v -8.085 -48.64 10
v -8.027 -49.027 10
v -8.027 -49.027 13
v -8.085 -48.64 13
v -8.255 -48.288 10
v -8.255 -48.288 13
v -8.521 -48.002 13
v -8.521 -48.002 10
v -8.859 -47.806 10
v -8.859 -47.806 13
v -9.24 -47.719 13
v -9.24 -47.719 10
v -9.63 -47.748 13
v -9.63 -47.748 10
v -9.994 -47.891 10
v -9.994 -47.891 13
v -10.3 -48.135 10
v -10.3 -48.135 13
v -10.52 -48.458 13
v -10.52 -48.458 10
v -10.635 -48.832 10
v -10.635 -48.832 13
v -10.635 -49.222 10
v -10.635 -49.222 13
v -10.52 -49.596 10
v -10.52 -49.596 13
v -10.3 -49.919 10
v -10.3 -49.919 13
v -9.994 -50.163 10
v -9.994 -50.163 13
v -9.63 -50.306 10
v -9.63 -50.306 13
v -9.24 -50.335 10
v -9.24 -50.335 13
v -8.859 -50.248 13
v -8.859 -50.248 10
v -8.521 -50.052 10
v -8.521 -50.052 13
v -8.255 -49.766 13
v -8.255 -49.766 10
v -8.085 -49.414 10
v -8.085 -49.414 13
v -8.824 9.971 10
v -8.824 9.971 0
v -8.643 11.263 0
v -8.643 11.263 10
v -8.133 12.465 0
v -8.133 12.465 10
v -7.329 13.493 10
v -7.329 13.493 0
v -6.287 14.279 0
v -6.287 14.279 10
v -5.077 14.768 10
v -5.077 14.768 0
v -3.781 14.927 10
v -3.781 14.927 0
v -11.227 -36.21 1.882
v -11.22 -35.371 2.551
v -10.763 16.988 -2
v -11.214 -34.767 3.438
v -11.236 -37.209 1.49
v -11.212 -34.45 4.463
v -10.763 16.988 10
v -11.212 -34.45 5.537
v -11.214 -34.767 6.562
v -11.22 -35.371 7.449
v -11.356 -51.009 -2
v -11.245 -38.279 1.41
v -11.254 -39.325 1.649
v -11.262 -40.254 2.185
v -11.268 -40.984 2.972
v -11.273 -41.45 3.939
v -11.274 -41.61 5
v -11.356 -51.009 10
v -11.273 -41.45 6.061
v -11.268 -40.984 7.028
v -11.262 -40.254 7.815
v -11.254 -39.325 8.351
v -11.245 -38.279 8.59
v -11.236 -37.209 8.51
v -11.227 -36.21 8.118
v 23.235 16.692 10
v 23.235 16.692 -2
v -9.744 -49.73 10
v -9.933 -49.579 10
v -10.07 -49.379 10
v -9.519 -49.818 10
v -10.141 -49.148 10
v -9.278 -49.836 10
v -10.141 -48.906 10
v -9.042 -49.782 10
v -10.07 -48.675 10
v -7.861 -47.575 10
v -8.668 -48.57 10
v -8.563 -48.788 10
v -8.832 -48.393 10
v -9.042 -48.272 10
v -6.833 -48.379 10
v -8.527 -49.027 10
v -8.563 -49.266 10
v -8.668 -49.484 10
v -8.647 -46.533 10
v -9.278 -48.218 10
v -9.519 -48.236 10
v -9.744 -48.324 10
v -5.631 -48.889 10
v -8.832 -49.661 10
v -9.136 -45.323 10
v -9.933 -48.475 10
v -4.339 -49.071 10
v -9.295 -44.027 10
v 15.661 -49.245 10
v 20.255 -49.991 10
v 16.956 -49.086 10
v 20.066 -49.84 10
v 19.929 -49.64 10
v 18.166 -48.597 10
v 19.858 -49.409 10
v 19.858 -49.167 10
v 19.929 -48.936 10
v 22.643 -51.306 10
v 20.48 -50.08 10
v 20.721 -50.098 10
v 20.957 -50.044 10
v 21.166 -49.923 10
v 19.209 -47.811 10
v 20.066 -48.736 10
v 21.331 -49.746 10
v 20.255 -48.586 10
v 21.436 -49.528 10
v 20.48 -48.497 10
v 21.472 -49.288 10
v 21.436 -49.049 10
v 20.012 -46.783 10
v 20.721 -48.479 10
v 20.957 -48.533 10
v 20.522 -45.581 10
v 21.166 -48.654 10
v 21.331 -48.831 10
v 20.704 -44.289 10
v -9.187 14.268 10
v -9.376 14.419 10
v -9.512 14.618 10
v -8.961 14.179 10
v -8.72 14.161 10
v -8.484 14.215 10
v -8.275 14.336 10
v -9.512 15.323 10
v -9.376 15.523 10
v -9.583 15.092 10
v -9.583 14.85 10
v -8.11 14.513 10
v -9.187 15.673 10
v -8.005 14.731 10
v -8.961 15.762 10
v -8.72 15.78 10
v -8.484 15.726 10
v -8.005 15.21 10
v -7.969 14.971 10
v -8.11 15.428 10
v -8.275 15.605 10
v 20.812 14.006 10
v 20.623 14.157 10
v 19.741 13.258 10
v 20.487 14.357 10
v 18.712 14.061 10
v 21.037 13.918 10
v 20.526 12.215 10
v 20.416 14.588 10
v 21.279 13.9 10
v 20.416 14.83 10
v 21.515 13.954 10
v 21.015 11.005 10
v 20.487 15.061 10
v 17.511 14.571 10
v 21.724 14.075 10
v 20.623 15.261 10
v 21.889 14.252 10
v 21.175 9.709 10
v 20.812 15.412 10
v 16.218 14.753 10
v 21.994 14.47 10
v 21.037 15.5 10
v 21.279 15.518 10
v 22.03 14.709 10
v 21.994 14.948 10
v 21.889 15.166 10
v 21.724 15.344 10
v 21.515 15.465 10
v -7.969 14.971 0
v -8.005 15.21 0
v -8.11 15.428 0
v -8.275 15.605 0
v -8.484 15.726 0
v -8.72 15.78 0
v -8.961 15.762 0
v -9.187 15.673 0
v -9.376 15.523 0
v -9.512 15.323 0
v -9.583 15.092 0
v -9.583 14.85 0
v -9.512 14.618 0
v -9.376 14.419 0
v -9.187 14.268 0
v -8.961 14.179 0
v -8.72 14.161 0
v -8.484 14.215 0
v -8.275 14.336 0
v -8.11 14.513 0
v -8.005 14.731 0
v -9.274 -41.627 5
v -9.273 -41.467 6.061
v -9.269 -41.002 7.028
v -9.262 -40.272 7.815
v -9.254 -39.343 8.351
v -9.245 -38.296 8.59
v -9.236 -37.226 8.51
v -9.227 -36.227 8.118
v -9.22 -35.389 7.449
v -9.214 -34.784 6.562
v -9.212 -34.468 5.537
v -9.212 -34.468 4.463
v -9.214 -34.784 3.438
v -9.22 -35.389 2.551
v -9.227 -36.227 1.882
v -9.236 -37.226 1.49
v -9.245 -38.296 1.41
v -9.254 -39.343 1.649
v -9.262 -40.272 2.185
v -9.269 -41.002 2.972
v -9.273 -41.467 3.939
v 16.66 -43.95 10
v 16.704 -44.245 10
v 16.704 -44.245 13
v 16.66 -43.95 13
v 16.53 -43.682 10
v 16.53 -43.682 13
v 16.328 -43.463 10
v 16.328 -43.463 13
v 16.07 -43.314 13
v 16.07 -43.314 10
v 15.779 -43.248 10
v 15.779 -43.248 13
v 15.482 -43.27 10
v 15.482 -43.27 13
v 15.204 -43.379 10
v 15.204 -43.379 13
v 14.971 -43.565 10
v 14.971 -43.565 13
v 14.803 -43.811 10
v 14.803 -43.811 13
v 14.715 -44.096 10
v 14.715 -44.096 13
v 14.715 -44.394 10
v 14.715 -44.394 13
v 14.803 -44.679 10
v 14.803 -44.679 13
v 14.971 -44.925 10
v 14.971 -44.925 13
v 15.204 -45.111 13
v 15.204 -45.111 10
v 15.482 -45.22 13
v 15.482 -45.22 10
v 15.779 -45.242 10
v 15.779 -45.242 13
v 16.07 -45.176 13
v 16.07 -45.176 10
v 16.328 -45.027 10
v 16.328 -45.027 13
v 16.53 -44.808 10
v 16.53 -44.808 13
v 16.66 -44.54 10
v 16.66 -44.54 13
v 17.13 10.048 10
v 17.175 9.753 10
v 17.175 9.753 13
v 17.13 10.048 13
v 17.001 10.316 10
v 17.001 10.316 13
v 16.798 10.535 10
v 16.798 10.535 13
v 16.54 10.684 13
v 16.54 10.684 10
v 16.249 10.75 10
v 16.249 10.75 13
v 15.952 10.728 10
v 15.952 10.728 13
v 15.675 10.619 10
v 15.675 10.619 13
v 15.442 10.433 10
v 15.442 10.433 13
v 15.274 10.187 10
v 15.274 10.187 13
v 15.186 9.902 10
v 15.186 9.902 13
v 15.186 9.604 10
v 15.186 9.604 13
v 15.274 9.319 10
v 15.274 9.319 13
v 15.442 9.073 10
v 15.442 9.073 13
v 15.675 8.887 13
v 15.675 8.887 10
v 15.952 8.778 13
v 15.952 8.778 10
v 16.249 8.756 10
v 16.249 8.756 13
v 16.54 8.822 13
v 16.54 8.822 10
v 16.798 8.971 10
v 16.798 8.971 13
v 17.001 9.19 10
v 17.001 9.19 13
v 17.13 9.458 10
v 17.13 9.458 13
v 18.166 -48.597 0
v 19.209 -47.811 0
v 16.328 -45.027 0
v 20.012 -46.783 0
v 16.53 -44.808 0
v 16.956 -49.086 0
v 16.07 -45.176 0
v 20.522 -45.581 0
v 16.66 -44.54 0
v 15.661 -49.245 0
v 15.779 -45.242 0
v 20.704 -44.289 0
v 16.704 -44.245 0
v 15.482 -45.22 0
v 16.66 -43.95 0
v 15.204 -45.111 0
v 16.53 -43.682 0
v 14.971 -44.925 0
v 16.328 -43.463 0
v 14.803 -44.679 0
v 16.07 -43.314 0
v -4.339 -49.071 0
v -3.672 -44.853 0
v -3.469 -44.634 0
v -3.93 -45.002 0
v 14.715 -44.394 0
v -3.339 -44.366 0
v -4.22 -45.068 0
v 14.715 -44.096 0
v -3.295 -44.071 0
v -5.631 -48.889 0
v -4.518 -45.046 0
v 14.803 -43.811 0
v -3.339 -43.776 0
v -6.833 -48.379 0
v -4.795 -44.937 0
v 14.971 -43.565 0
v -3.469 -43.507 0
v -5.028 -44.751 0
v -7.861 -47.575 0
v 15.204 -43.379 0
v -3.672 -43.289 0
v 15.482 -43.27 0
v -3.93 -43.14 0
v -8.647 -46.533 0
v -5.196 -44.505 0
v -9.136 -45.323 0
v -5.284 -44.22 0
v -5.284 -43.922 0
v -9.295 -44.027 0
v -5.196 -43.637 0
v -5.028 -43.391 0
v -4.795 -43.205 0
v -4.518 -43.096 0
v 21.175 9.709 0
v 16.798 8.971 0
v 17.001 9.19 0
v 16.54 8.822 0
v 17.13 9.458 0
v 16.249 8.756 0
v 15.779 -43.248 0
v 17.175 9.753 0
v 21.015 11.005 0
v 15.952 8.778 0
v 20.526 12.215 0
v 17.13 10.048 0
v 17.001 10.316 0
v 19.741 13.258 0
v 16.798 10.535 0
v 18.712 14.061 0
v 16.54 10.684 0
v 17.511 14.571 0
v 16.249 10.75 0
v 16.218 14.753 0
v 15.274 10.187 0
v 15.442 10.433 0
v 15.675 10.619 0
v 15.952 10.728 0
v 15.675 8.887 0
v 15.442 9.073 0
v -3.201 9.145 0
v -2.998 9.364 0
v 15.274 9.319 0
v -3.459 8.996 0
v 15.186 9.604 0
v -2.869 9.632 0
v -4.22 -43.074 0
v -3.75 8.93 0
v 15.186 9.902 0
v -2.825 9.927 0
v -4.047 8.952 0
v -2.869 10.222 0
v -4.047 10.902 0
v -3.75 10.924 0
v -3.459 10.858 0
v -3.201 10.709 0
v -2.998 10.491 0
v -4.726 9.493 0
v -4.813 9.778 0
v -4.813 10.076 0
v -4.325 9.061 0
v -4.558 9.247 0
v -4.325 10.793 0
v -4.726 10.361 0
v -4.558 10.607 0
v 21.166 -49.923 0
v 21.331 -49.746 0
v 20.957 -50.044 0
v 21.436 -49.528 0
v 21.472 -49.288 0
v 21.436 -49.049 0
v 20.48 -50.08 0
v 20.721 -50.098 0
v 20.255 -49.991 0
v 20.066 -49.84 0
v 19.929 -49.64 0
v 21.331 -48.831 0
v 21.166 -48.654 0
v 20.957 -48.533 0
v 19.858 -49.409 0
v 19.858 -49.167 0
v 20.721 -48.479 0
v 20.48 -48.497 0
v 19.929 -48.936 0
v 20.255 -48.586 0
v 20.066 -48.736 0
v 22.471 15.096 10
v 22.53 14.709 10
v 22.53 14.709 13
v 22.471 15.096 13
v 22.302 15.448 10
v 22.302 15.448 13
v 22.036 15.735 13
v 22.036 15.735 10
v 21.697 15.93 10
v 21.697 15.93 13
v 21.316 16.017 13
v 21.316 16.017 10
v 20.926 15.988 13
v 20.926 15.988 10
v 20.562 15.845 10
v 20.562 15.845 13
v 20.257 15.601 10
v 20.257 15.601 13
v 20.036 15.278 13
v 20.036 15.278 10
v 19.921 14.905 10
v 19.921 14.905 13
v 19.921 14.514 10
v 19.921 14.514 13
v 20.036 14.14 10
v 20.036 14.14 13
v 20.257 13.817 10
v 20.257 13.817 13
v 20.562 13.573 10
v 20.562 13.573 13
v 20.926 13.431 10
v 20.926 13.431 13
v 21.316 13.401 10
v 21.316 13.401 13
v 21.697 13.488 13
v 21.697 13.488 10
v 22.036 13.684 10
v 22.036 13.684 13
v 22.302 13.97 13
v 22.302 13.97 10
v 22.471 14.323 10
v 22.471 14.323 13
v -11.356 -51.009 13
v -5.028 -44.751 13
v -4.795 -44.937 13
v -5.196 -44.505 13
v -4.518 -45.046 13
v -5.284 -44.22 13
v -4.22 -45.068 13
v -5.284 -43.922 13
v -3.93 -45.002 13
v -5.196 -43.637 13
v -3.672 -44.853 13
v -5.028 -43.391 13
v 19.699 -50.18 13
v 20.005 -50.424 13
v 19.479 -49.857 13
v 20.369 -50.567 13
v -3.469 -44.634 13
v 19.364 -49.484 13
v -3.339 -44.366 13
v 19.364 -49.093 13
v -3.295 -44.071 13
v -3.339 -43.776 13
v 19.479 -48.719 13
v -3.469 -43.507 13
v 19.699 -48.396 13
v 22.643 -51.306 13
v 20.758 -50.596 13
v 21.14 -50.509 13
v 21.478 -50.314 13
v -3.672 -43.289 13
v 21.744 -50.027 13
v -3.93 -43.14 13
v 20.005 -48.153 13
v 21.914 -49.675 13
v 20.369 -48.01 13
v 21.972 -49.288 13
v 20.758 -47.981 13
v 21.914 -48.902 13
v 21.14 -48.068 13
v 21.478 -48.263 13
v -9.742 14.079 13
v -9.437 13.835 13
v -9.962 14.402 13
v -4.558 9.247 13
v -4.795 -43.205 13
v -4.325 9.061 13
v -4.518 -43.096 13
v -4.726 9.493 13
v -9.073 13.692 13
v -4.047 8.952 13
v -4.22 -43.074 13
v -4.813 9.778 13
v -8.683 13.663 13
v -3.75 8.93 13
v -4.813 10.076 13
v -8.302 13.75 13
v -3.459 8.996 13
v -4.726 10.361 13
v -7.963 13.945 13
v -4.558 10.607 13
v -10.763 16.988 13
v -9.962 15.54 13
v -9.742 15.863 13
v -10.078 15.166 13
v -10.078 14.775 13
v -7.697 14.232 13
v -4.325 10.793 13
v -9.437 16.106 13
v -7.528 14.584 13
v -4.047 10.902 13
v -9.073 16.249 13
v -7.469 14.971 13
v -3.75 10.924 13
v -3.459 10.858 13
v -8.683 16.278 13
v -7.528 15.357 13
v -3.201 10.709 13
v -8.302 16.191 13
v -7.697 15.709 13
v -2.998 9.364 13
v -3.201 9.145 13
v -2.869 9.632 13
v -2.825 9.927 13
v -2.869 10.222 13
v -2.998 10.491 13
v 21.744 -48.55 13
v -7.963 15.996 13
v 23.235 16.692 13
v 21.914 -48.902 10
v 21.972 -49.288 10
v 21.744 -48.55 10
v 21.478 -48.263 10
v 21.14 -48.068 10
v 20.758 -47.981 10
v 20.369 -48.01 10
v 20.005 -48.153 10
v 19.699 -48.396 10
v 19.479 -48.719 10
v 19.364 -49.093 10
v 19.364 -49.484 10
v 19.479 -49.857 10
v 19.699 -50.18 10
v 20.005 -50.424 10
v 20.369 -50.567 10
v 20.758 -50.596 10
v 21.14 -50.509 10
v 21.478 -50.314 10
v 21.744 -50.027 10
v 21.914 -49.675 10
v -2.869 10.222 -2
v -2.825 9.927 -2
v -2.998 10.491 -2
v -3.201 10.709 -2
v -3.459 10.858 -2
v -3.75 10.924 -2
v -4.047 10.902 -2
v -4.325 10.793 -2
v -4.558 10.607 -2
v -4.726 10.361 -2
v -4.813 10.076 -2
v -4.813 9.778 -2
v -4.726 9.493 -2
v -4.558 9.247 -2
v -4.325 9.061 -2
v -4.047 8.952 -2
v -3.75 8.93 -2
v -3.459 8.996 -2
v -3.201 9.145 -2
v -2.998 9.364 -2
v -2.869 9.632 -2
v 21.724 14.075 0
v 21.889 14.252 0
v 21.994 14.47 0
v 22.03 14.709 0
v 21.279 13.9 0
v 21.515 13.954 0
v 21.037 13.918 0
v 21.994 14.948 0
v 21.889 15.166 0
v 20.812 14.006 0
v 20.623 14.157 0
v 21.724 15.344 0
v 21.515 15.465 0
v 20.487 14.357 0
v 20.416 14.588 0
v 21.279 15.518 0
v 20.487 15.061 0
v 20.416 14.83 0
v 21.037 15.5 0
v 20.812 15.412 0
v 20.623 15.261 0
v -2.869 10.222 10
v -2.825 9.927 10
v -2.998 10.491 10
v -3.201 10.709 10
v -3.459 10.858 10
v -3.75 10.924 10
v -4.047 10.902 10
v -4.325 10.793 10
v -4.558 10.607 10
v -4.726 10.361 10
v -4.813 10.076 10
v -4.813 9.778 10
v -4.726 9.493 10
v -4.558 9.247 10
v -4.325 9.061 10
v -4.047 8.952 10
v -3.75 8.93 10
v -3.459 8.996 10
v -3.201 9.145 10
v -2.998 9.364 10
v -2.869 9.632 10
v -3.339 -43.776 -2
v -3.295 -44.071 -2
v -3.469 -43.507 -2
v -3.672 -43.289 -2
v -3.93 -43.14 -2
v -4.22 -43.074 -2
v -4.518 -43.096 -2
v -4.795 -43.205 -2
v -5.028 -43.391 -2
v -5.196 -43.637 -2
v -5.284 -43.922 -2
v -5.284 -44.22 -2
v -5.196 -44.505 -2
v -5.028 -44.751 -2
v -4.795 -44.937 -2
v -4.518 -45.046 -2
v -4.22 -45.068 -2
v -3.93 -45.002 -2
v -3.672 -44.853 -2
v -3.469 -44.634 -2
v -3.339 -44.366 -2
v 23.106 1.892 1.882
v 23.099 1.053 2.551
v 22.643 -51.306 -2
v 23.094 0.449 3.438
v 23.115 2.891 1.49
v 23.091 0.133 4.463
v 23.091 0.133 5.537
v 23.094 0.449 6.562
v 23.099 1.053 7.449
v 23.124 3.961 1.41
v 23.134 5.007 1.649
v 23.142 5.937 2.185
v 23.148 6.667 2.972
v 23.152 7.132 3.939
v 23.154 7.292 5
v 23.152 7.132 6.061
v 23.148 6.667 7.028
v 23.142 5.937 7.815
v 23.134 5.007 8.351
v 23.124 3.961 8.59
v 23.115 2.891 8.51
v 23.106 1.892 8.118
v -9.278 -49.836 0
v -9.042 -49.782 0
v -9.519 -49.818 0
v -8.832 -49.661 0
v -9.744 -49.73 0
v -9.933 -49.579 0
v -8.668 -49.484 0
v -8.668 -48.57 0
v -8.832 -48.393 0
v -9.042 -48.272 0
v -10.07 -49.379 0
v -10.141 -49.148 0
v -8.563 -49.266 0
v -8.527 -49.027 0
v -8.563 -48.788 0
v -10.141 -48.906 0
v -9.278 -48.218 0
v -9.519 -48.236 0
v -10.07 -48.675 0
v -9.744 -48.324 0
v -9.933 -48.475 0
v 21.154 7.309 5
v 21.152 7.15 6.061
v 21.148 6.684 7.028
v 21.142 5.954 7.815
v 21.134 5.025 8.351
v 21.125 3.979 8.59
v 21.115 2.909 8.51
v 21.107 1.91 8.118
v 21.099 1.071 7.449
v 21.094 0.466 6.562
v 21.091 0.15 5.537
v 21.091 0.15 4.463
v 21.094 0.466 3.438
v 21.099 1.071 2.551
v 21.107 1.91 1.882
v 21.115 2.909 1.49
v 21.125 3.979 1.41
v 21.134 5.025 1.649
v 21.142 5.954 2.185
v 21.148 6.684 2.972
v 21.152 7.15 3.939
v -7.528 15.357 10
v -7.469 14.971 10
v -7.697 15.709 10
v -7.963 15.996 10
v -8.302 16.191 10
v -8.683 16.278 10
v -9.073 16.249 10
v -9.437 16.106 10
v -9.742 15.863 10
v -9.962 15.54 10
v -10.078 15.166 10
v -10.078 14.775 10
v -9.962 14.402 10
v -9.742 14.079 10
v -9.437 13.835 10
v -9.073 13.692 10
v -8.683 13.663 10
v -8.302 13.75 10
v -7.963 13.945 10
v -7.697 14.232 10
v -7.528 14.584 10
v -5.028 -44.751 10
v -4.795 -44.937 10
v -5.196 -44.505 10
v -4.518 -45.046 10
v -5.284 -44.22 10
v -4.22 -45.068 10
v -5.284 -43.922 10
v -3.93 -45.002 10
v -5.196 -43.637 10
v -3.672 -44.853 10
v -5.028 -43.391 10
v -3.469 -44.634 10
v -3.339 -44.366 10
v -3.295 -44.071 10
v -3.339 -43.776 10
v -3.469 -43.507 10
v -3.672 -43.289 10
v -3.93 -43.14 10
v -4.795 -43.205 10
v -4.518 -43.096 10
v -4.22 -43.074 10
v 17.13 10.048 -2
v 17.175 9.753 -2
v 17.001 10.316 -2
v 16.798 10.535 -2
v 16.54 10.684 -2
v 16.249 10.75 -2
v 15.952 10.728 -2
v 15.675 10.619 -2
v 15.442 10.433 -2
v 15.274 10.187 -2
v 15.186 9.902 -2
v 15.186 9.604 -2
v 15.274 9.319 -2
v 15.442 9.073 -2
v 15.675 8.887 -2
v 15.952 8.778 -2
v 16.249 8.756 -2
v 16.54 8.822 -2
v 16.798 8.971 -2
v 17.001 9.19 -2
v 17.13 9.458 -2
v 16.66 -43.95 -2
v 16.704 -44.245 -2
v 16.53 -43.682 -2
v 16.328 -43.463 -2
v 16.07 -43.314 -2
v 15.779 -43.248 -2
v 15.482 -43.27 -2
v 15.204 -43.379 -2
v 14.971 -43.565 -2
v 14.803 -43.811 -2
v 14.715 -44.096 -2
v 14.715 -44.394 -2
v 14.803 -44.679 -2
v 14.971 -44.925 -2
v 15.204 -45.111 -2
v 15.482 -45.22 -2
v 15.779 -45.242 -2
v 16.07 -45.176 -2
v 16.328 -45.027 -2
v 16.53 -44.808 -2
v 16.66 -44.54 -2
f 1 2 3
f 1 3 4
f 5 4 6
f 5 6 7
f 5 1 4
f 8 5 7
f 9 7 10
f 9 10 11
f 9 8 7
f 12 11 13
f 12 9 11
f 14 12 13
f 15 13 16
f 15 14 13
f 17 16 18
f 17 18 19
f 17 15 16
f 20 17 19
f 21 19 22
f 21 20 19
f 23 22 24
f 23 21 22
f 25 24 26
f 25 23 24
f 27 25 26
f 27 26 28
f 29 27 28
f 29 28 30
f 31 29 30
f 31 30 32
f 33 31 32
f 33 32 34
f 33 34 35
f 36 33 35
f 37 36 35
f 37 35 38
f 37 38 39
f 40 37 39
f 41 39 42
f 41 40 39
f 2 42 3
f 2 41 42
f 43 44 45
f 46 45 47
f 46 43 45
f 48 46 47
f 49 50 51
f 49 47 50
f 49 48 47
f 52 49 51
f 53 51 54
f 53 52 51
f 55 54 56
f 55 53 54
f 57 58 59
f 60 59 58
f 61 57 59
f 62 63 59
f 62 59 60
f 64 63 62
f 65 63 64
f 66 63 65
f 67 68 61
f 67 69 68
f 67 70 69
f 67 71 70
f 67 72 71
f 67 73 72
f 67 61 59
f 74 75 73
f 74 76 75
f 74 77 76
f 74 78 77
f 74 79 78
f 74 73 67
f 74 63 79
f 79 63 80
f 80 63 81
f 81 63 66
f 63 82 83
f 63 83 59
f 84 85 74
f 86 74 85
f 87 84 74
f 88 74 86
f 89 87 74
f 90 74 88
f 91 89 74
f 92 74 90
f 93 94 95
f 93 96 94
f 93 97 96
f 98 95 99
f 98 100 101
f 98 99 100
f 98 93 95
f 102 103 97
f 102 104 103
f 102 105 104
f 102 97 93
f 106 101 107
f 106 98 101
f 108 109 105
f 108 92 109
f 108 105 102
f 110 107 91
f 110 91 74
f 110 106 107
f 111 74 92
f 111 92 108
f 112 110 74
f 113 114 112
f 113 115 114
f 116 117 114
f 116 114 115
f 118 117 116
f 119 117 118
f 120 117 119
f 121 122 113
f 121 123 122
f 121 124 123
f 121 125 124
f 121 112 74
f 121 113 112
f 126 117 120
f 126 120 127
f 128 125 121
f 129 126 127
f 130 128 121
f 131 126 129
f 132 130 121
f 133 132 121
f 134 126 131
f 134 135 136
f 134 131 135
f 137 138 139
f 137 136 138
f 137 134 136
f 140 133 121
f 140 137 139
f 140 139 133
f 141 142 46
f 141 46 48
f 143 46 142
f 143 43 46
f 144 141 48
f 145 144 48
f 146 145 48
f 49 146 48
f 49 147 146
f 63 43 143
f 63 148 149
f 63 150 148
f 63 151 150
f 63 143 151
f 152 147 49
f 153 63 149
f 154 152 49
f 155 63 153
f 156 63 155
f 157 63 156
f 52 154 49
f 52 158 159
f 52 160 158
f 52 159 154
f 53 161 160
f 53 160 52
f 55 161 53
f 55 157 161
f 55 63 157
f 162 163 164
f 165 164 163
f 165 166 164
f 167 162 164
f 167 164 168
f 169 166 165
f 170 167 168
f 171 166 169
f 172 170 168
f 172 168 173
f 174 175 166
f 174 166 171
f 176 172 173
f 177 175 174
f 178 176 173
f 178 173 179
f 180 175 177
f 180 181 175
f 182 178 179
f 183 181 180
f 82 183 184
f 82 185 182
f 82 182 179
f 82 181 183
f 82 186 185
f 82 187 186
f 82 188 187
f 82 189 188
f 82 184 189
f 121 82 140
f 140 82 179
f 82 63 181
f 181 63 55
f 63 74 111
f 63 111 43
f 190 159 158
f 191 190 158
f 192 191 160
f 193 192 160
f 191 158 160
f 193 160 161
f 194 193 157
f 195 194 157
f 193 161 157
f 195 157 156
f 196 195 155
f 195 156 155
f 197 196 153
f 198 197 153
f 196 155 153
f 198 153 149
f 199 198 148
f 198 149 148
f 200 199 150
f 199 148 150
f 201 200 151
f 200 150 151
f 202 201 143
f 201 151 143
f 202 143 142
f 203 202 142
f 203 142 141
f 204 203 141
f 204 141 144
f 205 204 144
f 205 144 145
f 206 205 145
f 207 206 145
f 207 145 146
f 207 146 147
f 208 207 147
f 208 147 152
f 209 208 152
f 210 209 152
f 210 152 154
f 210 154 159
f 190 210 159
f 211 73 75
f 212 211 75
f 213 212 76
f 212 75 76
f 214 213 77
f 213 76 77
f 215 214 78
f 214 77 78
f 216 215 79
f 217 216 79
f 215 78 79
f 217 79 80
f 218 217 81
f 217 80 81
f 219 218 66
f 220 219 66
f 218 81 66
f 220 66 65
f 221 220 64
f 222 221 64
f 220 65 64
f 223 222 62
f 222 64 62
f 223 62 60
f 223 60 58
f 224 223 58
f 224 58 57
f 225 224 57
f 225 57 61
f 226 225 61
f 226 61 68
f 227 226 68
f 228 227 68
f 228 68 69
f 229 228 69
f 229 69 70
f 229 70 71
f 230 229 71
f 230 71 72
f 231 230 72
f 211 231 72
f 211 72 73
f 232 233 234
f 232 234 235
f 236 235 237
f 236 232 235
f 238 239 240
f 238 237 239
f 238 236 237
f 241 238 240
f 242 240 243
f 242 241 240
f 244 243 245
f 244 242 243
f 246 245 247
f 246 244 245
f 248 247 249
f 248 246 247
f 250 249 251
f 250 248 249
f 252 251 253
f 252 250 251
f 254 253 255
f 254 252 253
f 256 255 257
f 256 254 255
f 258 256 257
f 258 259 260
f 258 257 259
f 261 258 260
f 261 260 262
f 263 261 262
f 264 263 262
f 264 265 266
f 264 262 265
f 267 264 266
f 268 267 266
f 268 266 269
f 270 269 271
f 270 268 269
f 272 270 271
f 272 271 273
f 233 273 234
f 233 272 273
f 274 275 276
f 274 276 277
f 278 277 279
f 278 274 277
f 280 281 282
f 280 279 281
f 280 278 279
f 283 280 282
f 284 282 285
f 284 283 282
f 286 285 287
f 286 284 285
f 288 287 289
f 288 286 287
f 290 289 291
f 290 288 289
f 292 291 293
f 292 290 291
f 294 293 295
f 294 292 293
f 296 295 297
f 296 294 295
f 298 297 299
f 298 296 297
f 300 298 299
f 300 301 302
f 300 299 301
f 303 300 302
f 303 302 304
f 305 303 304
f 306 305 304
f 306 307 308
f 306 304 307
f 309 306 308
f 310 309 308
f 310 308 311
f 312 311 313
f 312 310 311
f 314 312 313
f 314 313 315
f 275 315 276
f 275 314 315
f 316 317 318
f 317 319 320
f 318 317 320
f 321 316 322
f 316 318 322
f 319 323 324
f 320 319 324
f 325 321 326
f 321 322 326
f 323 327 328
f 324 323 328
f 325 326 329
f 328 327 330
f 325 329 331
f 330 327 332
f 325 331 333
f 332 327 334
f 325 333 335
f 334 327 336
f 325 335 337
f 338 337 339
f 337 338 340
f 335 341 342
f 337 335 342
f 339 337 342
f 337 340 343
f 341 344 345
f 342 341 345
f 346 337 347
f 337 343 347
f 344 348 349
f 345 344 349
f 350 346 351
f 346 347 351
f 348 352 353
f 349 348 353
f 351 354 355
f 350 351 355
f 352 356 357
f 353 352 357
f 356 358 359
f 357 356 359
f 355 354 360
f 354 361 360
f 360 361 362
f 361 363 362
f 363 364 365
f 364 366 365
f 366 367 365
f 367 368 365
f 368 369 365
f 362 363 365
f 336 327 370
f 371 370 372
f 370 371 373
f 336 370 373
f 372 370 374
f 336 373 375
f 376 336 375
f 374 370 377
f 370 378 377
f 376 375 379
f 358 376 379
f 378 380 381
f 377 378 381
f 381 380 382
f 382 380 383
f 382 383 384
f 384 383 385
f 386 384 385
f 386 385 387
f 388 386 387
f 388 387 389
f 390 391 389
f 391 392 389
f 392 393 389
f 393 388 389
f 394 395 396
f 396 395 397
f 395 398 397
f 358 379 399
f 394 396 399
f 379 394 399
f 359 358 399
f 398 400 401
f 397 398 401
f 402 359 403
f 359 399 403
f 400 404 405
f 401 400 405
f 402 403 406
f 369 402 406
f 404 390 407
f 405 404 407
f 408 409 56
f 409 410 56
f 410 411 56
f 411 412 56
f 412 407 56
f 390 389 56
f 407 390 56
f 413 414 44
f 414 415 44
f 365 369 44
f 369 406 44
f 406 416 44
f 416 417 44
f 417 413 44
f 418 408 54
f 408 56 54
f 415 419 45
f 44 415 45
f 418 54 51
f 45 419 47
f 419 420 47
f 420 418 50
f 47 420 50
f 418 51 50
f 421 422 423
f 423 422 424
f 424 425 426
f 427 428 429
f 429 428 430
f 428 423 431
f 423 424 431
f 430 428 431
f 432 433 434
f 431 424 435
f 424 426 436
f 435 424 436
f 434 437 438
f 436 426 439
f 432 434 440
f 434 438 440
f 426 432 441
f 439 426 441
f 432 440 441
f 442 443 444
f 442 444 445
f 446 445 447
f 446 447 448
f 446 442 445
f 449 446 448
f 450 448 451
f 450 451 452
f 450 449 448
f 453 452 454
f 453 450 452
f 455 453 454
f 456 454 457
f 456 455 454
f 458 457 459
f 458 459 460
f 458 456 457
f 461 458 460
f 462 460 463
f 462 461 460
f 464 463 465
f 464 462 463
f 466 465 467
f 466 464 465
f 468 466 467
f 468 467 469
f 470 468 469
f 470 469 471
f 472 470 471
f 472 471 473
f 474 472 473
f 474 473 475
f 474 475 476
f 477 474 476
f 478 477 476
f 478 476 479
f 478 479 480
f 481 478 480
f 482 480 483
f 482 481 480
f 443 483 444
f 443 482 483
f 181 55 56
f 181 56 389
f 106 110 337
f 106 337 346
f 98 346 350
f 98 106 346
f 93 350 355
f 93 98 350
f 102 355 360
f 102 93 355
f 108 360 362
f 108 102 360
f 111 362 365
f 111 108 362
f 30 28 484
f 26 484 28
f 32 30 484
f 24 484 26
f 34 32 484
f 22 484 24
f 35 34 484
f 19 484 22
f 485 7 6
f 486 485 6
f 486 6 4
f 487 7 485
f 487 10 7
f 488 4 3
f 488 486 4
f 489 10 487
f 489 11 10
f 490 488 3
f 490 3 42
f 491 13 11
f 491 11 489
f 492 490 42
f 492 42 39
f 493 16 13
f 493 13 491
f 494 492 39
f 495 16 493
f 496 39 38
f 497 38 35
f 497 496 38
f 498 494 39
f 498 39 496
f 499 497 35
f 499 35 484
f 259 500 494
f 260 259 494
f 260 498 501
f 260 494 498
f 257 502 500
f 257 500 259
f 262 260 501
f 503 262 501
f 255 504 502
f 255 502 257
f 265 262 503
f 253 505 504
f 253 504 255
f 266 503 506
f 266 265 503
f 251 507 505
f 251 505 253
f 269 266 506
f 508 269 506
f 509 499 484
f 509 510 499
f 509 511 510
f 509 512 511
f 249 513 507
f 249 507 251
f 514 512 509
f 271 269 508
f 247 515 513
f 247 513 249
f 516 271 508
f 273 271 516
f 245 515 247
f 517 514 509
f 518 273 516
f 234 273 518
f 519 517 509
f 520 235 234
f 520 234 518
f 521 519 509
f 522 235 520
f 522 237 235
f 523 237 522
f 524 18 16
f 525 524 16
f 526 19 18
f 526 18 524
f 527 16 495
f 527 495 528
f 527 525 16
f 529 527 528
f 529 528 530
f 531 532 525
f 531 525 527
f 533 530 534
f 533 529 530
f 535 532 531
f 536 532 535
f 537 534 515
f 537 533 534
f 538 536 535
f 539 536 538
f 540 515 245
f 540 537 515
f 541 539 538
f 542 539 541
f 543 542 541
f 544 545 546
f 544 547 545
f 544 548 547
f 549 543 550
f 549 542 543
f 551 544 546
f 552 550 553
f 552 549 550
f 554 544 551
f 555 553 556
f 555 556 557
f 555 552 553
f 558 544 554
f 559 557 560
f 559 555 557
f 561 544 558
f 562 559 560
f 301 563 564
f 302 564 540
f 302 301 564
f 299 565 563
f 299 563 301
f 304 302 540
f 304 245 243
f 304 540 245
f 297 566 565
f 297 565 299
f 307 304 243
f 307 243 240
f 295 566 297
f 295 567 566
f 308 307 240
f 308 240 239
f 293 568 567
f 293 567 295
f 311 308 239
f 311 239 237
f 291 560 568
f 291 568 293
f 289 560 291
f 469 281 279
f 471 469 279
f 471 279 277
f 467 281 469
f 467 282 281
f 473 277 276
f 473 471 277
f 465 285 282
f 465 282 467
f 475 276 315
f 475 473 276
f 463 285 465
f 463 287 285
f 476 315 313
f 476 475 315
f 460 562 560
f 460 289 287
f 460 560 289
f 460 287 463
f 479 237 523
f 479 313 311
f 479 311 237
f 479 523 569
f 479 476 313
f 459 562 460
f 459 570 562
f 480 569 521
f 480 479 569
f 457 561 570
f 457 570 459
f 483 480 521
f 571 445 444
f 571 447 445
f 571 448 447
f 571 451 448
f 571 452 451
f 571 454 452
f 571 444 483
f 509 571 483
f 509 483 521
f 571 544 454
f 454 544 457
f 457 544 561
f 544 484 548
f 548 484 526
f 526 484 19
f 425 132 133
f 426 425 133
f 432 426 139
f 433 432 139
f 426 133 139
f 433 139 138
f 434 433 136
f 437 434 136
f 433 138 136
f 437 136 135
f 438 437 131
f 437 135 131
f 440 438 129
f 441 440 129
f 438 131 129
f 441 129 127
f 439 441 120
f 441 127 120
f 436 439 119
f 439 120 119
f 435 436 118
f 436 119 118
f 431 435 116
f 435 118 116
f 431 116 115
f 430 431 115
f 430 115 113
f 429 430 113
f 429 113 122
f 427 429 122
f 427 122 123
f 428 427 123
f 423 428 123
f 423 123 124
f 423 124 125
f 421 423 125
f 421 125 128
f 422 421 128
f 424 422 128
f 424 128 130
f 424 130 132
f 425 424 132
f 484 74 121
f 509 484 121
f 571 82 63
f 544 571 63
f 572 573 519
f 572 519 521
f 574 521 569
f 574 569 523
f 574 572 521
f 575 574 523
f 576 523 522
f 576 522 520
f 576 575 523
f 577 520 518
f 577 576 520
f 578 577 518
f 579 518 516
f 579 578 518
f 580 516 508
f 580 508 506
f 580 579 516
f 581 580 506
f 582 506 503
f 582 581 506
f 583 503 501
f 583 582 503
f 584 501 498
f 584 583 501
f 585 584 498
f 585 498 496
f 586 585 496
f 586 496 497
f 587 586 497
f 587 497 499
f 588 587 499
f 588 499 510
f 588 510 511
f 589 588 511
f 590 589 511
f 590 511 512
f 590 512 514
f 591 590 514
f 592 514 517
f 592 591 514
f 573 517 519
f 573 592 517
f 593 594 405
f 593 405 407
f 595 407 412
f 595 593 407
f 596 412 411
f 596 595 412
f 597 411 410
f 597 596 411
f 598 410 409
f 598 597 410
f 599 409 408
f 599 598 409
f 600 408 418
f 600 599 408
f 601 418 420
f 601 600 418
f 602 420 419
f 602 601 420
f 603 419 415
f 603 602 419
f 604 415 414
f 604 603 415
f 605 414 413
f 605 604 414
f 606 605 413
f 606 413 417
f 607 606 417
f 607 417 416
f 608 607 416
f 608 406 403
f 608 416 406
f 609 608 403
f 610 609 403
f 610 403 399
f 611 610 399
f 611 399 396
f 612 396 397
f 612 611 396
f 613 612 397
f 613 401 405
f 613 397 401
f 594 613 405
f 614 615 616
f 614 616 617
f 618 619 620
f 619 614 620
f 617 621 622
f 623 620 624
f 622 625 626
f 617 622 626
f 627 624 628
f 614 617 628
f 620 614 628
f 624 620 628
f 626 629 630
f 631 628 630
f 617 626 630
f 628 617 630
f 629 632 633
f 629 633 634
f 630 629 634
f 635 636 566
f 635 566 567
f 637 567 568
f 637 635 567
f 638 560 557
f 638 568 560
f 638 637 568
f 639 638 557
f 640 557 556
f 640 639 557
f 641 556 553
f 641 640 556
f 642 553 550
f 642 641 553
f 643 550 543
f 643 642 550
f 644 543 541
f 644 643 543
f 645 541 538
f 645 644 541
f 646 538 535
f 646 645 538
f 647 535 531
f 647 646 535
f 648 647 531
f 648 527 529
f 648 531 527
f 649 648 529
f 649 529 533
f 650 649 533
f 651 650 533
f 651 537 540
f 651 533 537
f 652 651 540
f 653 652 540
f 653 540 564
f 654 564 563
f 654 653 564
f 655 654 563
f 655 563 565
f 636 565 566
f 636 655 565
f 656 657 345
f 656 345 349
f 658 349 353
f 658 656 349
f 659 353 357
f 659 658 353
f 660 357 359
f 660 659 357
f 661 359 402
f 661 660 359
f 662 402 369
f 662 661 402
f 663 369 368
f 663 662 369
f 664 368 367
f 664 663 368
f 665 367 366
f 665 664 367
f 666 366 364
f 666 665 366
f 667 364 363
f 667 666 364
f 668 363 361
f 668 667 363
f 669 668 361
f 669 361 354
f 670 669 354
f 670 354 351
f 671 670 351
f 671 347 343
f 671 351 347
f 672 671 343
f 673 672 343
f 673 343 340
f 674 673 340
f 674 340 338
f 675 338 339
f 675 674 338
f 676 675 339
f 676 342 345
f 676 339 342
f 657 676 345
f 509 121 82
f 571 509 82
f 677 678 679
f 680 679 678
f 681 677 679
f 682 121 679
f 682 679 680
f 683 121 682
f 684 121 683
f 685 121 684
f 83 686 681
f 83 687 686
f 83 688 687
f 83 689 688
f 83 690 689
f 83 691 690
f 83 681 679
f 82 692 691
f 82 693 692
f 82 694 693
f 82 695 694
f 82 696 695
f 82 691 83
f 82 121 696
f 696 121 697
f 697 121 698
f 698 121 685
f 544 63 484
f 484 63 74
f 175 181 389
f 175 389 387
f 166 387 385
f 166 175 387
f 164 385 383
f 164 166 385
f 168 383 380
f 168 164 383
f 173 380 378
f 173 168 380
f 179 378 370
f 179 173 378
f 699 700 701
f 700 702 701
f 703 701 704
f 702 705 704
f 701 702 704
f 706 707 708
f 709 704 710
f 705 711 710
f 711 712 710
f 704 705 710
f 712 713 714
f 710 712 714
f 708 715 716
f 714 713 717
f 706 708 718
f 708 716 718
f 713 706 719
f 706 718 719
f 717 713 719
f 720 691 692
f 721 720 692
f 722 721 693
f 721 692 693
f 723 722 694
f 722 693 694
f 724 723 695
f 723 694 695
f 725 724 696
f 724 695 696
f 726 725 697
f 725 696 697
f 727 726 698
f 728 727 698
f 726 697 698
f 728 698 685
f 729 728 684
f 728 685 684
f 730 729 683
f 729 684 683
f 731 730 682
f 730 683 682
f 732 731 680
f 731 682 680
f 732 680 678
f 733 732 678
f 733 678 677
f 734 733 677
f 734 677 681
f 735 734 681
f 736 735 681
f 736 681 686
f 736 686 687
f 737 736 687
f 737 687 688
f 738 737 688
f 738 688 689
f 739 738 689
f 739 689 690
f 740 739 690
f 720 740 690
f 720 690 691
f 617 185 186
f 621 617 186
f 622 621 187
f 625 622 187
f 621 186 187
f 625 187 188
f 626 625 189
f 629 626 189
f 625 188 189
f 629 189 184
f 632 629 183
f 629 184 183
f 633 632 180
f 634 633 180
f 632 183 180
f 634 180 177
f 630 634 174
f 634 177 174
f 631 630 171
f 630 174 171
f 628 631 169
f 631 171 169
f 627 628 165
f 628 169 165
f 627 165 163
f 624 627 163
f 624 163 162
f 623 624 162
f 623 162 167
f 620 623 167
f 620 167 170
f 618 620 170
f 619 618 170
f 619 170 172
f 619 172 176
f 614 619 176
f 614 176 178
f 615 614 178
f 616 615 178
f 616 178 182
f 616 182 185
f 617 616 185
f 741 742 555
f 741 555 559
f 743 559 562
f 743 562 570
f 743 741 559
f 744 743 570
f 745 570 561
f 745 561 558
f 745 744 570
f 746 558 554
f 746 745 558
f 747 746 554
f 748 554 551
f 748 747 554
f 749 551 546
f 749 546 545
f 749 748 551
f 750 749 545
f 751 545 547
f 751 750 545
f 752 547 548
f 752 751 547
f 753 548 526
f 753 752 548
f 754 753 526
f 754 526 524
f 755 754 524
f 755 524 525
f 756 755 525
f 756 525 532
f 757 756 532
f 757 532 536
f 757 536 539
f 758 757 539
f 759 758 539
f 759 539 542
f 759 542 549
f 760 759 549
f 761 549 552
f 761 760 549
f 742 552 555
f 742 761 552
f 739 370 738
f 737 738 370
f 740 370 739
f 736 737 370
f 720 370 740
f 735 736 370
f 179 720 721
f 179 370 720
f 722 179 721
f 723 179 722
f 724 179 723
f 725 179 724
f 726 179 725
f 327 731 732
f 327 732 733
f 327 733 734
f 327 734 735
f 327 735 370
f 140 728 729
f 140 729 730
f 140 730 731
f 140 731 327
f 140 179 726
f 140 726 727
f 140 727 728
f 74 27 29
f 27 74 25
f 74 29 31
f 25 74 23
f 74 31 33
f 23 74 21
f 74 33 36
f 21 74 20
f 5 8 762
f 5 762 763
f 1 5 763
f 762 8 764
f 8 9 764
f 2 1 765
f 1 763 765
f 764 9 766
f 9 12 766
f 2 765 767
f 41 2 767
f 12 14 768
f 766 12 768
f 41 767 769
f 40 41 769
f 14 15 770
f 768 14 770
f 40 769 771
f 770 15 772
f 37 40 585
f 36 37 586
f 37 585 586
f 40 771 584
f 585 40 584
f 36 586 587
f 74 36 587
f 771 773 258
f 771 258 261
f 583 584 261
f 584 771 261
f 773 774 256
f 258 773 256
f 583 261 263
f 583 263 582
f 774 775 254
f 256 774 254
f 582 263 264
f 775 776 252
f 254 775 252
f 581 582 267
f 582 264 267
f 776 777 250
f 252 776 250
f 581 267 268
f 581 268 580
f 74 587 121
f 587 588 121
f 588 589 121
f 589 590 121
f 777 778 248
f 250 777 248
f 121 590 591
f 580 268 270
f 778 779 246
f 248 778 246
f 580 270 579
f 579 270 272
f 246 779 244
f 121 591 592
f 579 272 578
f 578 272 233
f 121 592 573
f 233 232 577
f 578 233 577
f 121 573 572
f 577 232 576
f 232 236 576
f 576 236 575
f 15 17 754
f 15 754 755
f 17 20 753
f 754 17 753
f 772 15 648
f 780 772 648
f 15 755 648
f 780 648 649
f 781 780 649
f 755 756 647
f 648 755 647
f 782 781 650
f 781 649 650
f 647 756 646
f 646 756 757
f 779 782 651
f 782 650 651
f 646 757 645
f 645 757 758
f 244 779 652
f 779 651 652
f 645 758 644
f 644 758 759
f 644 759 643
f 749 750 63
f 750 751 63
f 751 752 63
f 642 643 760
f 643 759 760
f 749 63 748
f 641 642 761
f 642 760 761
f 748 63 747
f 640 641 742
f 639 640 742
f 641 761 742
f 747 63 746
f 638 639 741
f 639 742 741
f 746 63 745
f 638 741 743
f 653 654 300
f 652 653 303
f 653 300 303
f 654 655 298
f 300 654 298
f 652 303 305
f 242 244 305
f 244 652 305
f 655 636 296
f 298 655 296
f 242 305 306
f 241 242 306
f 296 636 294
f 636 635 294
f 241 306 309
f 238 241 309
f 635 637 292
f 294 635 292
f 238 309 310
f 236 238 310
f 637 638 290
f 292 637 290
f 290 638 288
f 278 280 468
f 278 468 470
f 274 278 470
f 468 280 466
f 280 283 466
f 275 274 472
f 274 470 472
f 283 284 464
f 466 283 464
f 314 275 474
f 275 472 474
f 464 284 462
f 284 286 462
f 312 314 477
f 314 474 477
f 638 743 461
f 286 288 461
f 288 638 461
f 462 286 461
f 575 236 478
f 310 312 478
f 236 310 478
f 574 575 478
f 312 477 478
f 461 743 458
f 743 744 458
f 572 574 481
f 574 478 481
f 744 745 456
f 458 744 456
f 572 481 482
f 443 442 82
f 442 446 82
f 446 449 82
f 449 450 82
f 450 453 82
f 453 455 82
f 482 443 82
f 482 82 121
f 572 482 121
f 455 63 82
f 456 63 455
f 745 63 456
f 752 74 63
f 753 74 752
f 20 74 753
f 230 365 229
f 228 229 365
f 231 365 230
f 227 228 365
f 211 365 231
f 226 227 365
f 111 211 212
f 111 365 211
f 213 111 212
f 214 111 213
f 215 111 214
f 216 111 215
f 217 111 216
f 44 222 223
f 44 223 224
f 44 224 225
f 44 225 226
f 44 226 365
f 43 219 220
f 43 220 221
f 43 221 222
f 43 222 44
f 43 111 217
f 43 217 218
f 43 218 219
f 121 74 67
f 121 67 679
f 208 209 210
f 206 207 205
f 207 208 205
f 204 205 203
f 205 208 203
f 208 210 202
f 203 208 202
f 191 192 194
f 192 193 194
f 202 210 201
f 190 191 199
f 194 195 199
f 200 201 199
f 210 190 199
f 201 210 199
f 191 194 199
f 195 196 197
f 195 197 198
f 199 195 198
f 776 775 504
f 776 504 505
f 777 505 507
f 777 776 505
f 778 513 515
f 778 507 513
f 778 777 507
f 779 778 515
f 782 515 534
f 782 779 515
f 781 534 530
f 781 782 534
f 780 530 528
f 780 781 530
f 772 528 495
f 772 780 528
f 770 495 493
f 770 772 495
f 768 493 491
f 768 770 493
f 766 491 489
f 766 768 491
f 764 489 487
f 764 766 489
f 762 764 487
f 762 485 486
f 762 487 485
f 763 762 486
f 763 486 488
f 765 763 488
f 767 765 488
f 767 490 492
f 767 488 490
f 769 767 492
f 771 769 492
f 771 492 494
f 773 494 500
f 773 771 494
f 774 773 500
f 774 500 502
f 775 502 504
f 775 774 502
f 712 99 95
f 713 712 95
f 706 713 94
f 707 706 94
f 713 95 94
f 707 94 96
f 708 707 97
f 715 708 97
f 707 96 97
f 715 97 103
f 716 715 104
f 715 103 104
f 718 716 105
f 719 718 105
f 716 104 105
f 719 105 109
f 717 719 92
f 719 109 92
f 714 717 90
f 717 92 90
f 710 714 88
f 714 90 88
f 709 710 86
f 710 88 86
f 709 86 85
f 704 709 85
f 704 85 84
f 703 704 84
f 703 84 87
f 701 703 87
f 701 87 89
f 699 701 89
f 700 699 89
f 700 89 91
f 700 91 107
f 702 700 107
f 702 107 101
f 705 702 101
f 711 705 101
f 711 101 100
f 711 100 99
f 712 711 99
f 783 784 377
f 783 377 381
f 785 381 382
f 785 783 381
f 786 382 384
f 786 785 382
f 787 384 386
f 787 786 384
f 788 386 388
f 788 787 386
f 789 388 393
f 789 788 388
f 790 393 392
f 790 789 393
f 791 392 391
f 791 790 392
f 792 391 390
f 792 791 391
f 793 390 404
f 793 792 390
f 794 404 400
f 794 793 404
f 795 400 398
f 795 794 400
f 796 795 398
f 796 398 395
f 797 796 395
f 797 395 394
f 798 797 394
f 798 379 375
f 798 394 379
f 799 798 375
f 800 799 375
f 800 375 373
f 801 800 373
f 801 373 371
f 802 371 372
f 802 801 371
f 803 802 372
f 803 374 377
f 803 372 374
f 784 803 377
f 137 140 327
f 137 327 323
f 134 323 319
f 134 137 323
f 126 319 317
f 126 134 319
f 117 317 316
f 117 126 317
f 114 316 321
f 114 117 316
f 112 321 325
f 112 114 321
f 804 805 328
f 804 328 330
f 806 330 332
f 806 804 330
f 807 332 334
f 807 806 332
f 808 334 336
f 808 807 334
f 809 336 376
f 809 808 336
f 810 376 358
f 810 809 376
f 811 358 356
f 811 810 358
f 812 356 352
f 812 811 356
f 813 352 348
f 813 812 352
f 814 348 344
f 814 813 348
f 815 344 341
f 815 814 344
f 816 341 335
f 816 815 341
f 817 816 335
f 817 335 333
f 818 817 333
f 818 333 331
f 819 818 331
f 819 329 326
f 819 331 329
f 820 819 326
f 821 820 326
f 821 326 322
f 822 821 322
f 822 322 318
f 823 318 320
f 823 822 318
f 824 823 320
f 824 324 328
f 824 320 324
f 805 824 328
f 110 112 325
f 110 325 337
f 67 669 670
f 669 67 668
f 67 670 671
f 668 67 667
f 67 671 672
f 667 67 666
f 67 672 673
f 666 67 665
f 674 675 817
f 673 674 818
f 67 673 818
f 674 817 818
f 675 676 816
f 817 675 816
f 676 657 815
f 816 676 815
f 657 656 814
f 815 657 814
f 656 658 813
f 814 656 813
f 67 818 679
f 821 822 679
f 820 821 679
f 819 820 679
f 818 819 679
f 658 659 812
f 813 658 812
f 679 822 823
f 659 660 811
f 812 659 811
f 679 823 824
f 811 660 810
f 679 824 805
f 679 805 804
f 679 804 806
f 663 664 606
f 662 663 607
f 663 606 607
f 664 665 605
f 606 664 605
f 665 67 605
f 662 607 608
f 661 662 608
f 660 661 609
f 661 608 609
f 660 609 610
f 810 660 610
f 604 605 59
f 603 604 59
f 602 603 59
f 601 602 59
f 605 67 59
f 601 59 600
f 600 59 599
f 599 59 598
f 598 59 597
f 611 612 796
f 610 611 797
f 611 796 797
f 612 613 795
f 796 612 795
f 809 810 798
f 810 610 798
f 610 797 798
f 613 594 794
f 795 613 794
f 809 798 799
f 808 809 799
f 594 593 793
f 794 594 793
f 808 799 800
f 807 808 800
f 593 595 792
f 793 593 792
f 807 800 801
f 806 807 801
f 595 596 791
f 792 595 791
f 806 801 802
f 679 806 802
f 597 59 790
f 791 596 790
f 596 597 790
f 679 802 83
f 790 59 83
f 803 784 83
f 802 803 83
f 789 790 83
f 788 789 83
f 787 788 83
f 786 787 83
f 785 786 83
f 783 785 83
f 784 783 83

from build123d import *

# Parameters (mm, degrees)
SKETCH2_R               = 0.8115
BOSS_EXTRUDE1_DEPTH     = 12
BOSS_EXTRUDE2_DEPTH     = 2
SKETCH4_R               = 3.6
CUT_EXTRUDE1_DEPTH      = 3
SKETCH5_R               = 3.6
CUT_EXTRUDE2_DEPTH      = 3
SKETCH10_R              = 1.3115
BOSS_EXTRUDE3_DEPTH     = 3
CUT_EXTRUDE3_DEPTH      = 58.802809601
CUT_EXTRUDE3_DEPTH_BACK = 58.802809601
SKETCH11_R              = 1


with BuildPart() as part:
    # Sketch2 → Boss-Extrude1 (new body)
    with BuildSketch(Plane.XY.offset(10)):
        Polygon((22.642908935, -51.305750842), (23.235419693, 16.691667719), (-10.763289588, 16.987923098), (-11.355800345, -51.009495464), align=None)
        with Locations((-9.338449483, -49.026998175)):
            Circle(SKETCH2_R, mode=Mode.SUBTRACT)
        with Locations((20.660411647, -49.28839998)):
            Circle(SKETCH2_R, mode=Mode.SUBTRACT)
        with Locations((-8.7807923, 14.970572235)):
            Circle(SKETCH2_R, mode=Mode.SUBTRACT)
        with Locations((21.21806883, 14.709170431)):
            Circle(SKETCH2_R, mode=Mode.SUBTRACT)
        with BuildLine():
            Line((-9.294882486, -44.027187957), (-8.824359238, 9.970762017))
            ThreePointArc((-8.824359238, 9.970762017), (-7.32914224, 13.493401237), (-3.780982082, 14.927005238))
            Line((-3.780982082, 14.927005238), (16.218258612, 14.752737369))
            ThreePointArc((16.218258612, 14.752737369), (19.740897831, 13.257520371), (21.174501833, 9.709360213))
            Line((21.174501833, 9.709360213), (20.703978585, -44.288589762))
            ThreePointArc((20.703978585, -44.288589762), (19.208761587, -47.811228981), (15.660601429, -49.244832982))
            Line((15.660601429, -49.244832982), (-4.338639265, -49.070565113))
            ThreePointArc((-4.338639265, -49.070565113), (-7.861278484, -47.575348116), (-9.294882486, -44.027187957))
        make_face(mode=Mode.SUBTRACT)
    extrude(amount=-BOSS_EXTRUDE1_DEPTH)

    # Sketch3 → Boss-Extrude2 (add)
    with BuildSketch(Plane(origin=(0, 0, -2), x_dir=(-1, 0, 0), z_dir=(0, 0, -1))):
        Polygon((-22.642908935, -51.305750842), (11.355800345, -51.009495464), (10.763289588, 16.987923098), (-23.235419693, 16.691667719), align=None)
    extrude(amount=-BOSS_EXTRUDE2_DEPTH)

    # Sketch4 → Cut-Extrude1 (cut)
    with BuildSketch(Plane(origin=(-10.910489244, 0.095070995, 0), x_dir=(0, 0, -1), z_dir=(-0.9999620376663749, 0.008713393489992394, 0))):
        with Locations(Location((-5, 38.106506551, 0), (0, 0, 90))):
            Circle(SKETCH4_R)
    extrude(amount=-CUT_EXTRUDE1_DEPTH, mode=Mode.SUBTRACT)

    # Sketch5 → Cut-Extrude2 (cut)
    with BuildSketch(Plane(origin=(23.088220037, -0.201184384, 0), x_dir=(0, 0, 1), z_dir=(0.9999620376663749, -0.008713393489992394, 0))):
        with Locations(Location((5, -3.893493389, 0), (0, 0, 270))):
            Circle(SKETCH5_R)
    extrude(amount=-CUT_EXTRUDE2_DEPTH, mode=Mode.SUBTRACT)


with BuildPart() as body_2:
    # Sketch10 → Boss-Extrude3 (new body)
    with BuildSketch(Plane.XY.offset(10)):
        Polygon((-11.355800345, -51.009495464), (22.642908935, -51.305750842), (23.235419693, 16.691667719), (-10.763289588, 16.987923098), align=None)
        with Locations((20.660411647, -49.28839998)):
            Circle(SKETCH10_R, mode=Mode.SUBTRACT)
        with Locations((21.21806883, 14.709170431)):
            Circle(SKETCH10_R, mode=Mode.SUBTRACT)
        with Locations((-8.7807923, 14.970572235)):
            Circle(SKETCH10_R, mode=Mode.SUBTRACT)
        with Locations((-9.338449483, -49.026998175)):
            Circle(SKETCH10_R, mode=Mode.SUBTRACT)
    extrude(amount=BOSS_EXTRUDE3_DEPTH)


with BuildPart() as cut_extrude3_tool:
    # Sketch11 → Cut-Extrude3 (new, two sides: drawn at the far end of the back side and taken through both)
    with BuildSketch(Plane.XY.offset(-CUT_EXTRUDE3_DEPTH_BACK)):
        with Locations((16.174691644, 9.75292718)):
            Circle(SKETCH11_R)
        with Locations((-3.824549049, 9.92719505)):
            Circle(SKETCH11_R)
        with Locations((15.704168396, -44.245022794)):
            Circle(SKETCH11_R)
        with Locations((-4.295072297, -44.070754925)):
            Circle(SKETCH11_R)
    extrude(amount=CUT_EXTRUDE3_DEPTH + CUT_EXTRUDE3_DEPTH_BACK)


with BuildPart() as part_1:
    add(part.part)

    # Cut-Extrude3: cut by cut_extrude3_tool
    add(cut_extrude3_tool.part, mode=Mode.SUBTRACT)


with BuildPart() as body_2_1:
    add(body_2.part)

    # Cut-Extrude3: cut by cut_extrude3_tool
    add(cut_extrude3_tool.part, mode=Mode.SUBTRACT)


solid = Compound([part_1.part, body_2_1.part])
